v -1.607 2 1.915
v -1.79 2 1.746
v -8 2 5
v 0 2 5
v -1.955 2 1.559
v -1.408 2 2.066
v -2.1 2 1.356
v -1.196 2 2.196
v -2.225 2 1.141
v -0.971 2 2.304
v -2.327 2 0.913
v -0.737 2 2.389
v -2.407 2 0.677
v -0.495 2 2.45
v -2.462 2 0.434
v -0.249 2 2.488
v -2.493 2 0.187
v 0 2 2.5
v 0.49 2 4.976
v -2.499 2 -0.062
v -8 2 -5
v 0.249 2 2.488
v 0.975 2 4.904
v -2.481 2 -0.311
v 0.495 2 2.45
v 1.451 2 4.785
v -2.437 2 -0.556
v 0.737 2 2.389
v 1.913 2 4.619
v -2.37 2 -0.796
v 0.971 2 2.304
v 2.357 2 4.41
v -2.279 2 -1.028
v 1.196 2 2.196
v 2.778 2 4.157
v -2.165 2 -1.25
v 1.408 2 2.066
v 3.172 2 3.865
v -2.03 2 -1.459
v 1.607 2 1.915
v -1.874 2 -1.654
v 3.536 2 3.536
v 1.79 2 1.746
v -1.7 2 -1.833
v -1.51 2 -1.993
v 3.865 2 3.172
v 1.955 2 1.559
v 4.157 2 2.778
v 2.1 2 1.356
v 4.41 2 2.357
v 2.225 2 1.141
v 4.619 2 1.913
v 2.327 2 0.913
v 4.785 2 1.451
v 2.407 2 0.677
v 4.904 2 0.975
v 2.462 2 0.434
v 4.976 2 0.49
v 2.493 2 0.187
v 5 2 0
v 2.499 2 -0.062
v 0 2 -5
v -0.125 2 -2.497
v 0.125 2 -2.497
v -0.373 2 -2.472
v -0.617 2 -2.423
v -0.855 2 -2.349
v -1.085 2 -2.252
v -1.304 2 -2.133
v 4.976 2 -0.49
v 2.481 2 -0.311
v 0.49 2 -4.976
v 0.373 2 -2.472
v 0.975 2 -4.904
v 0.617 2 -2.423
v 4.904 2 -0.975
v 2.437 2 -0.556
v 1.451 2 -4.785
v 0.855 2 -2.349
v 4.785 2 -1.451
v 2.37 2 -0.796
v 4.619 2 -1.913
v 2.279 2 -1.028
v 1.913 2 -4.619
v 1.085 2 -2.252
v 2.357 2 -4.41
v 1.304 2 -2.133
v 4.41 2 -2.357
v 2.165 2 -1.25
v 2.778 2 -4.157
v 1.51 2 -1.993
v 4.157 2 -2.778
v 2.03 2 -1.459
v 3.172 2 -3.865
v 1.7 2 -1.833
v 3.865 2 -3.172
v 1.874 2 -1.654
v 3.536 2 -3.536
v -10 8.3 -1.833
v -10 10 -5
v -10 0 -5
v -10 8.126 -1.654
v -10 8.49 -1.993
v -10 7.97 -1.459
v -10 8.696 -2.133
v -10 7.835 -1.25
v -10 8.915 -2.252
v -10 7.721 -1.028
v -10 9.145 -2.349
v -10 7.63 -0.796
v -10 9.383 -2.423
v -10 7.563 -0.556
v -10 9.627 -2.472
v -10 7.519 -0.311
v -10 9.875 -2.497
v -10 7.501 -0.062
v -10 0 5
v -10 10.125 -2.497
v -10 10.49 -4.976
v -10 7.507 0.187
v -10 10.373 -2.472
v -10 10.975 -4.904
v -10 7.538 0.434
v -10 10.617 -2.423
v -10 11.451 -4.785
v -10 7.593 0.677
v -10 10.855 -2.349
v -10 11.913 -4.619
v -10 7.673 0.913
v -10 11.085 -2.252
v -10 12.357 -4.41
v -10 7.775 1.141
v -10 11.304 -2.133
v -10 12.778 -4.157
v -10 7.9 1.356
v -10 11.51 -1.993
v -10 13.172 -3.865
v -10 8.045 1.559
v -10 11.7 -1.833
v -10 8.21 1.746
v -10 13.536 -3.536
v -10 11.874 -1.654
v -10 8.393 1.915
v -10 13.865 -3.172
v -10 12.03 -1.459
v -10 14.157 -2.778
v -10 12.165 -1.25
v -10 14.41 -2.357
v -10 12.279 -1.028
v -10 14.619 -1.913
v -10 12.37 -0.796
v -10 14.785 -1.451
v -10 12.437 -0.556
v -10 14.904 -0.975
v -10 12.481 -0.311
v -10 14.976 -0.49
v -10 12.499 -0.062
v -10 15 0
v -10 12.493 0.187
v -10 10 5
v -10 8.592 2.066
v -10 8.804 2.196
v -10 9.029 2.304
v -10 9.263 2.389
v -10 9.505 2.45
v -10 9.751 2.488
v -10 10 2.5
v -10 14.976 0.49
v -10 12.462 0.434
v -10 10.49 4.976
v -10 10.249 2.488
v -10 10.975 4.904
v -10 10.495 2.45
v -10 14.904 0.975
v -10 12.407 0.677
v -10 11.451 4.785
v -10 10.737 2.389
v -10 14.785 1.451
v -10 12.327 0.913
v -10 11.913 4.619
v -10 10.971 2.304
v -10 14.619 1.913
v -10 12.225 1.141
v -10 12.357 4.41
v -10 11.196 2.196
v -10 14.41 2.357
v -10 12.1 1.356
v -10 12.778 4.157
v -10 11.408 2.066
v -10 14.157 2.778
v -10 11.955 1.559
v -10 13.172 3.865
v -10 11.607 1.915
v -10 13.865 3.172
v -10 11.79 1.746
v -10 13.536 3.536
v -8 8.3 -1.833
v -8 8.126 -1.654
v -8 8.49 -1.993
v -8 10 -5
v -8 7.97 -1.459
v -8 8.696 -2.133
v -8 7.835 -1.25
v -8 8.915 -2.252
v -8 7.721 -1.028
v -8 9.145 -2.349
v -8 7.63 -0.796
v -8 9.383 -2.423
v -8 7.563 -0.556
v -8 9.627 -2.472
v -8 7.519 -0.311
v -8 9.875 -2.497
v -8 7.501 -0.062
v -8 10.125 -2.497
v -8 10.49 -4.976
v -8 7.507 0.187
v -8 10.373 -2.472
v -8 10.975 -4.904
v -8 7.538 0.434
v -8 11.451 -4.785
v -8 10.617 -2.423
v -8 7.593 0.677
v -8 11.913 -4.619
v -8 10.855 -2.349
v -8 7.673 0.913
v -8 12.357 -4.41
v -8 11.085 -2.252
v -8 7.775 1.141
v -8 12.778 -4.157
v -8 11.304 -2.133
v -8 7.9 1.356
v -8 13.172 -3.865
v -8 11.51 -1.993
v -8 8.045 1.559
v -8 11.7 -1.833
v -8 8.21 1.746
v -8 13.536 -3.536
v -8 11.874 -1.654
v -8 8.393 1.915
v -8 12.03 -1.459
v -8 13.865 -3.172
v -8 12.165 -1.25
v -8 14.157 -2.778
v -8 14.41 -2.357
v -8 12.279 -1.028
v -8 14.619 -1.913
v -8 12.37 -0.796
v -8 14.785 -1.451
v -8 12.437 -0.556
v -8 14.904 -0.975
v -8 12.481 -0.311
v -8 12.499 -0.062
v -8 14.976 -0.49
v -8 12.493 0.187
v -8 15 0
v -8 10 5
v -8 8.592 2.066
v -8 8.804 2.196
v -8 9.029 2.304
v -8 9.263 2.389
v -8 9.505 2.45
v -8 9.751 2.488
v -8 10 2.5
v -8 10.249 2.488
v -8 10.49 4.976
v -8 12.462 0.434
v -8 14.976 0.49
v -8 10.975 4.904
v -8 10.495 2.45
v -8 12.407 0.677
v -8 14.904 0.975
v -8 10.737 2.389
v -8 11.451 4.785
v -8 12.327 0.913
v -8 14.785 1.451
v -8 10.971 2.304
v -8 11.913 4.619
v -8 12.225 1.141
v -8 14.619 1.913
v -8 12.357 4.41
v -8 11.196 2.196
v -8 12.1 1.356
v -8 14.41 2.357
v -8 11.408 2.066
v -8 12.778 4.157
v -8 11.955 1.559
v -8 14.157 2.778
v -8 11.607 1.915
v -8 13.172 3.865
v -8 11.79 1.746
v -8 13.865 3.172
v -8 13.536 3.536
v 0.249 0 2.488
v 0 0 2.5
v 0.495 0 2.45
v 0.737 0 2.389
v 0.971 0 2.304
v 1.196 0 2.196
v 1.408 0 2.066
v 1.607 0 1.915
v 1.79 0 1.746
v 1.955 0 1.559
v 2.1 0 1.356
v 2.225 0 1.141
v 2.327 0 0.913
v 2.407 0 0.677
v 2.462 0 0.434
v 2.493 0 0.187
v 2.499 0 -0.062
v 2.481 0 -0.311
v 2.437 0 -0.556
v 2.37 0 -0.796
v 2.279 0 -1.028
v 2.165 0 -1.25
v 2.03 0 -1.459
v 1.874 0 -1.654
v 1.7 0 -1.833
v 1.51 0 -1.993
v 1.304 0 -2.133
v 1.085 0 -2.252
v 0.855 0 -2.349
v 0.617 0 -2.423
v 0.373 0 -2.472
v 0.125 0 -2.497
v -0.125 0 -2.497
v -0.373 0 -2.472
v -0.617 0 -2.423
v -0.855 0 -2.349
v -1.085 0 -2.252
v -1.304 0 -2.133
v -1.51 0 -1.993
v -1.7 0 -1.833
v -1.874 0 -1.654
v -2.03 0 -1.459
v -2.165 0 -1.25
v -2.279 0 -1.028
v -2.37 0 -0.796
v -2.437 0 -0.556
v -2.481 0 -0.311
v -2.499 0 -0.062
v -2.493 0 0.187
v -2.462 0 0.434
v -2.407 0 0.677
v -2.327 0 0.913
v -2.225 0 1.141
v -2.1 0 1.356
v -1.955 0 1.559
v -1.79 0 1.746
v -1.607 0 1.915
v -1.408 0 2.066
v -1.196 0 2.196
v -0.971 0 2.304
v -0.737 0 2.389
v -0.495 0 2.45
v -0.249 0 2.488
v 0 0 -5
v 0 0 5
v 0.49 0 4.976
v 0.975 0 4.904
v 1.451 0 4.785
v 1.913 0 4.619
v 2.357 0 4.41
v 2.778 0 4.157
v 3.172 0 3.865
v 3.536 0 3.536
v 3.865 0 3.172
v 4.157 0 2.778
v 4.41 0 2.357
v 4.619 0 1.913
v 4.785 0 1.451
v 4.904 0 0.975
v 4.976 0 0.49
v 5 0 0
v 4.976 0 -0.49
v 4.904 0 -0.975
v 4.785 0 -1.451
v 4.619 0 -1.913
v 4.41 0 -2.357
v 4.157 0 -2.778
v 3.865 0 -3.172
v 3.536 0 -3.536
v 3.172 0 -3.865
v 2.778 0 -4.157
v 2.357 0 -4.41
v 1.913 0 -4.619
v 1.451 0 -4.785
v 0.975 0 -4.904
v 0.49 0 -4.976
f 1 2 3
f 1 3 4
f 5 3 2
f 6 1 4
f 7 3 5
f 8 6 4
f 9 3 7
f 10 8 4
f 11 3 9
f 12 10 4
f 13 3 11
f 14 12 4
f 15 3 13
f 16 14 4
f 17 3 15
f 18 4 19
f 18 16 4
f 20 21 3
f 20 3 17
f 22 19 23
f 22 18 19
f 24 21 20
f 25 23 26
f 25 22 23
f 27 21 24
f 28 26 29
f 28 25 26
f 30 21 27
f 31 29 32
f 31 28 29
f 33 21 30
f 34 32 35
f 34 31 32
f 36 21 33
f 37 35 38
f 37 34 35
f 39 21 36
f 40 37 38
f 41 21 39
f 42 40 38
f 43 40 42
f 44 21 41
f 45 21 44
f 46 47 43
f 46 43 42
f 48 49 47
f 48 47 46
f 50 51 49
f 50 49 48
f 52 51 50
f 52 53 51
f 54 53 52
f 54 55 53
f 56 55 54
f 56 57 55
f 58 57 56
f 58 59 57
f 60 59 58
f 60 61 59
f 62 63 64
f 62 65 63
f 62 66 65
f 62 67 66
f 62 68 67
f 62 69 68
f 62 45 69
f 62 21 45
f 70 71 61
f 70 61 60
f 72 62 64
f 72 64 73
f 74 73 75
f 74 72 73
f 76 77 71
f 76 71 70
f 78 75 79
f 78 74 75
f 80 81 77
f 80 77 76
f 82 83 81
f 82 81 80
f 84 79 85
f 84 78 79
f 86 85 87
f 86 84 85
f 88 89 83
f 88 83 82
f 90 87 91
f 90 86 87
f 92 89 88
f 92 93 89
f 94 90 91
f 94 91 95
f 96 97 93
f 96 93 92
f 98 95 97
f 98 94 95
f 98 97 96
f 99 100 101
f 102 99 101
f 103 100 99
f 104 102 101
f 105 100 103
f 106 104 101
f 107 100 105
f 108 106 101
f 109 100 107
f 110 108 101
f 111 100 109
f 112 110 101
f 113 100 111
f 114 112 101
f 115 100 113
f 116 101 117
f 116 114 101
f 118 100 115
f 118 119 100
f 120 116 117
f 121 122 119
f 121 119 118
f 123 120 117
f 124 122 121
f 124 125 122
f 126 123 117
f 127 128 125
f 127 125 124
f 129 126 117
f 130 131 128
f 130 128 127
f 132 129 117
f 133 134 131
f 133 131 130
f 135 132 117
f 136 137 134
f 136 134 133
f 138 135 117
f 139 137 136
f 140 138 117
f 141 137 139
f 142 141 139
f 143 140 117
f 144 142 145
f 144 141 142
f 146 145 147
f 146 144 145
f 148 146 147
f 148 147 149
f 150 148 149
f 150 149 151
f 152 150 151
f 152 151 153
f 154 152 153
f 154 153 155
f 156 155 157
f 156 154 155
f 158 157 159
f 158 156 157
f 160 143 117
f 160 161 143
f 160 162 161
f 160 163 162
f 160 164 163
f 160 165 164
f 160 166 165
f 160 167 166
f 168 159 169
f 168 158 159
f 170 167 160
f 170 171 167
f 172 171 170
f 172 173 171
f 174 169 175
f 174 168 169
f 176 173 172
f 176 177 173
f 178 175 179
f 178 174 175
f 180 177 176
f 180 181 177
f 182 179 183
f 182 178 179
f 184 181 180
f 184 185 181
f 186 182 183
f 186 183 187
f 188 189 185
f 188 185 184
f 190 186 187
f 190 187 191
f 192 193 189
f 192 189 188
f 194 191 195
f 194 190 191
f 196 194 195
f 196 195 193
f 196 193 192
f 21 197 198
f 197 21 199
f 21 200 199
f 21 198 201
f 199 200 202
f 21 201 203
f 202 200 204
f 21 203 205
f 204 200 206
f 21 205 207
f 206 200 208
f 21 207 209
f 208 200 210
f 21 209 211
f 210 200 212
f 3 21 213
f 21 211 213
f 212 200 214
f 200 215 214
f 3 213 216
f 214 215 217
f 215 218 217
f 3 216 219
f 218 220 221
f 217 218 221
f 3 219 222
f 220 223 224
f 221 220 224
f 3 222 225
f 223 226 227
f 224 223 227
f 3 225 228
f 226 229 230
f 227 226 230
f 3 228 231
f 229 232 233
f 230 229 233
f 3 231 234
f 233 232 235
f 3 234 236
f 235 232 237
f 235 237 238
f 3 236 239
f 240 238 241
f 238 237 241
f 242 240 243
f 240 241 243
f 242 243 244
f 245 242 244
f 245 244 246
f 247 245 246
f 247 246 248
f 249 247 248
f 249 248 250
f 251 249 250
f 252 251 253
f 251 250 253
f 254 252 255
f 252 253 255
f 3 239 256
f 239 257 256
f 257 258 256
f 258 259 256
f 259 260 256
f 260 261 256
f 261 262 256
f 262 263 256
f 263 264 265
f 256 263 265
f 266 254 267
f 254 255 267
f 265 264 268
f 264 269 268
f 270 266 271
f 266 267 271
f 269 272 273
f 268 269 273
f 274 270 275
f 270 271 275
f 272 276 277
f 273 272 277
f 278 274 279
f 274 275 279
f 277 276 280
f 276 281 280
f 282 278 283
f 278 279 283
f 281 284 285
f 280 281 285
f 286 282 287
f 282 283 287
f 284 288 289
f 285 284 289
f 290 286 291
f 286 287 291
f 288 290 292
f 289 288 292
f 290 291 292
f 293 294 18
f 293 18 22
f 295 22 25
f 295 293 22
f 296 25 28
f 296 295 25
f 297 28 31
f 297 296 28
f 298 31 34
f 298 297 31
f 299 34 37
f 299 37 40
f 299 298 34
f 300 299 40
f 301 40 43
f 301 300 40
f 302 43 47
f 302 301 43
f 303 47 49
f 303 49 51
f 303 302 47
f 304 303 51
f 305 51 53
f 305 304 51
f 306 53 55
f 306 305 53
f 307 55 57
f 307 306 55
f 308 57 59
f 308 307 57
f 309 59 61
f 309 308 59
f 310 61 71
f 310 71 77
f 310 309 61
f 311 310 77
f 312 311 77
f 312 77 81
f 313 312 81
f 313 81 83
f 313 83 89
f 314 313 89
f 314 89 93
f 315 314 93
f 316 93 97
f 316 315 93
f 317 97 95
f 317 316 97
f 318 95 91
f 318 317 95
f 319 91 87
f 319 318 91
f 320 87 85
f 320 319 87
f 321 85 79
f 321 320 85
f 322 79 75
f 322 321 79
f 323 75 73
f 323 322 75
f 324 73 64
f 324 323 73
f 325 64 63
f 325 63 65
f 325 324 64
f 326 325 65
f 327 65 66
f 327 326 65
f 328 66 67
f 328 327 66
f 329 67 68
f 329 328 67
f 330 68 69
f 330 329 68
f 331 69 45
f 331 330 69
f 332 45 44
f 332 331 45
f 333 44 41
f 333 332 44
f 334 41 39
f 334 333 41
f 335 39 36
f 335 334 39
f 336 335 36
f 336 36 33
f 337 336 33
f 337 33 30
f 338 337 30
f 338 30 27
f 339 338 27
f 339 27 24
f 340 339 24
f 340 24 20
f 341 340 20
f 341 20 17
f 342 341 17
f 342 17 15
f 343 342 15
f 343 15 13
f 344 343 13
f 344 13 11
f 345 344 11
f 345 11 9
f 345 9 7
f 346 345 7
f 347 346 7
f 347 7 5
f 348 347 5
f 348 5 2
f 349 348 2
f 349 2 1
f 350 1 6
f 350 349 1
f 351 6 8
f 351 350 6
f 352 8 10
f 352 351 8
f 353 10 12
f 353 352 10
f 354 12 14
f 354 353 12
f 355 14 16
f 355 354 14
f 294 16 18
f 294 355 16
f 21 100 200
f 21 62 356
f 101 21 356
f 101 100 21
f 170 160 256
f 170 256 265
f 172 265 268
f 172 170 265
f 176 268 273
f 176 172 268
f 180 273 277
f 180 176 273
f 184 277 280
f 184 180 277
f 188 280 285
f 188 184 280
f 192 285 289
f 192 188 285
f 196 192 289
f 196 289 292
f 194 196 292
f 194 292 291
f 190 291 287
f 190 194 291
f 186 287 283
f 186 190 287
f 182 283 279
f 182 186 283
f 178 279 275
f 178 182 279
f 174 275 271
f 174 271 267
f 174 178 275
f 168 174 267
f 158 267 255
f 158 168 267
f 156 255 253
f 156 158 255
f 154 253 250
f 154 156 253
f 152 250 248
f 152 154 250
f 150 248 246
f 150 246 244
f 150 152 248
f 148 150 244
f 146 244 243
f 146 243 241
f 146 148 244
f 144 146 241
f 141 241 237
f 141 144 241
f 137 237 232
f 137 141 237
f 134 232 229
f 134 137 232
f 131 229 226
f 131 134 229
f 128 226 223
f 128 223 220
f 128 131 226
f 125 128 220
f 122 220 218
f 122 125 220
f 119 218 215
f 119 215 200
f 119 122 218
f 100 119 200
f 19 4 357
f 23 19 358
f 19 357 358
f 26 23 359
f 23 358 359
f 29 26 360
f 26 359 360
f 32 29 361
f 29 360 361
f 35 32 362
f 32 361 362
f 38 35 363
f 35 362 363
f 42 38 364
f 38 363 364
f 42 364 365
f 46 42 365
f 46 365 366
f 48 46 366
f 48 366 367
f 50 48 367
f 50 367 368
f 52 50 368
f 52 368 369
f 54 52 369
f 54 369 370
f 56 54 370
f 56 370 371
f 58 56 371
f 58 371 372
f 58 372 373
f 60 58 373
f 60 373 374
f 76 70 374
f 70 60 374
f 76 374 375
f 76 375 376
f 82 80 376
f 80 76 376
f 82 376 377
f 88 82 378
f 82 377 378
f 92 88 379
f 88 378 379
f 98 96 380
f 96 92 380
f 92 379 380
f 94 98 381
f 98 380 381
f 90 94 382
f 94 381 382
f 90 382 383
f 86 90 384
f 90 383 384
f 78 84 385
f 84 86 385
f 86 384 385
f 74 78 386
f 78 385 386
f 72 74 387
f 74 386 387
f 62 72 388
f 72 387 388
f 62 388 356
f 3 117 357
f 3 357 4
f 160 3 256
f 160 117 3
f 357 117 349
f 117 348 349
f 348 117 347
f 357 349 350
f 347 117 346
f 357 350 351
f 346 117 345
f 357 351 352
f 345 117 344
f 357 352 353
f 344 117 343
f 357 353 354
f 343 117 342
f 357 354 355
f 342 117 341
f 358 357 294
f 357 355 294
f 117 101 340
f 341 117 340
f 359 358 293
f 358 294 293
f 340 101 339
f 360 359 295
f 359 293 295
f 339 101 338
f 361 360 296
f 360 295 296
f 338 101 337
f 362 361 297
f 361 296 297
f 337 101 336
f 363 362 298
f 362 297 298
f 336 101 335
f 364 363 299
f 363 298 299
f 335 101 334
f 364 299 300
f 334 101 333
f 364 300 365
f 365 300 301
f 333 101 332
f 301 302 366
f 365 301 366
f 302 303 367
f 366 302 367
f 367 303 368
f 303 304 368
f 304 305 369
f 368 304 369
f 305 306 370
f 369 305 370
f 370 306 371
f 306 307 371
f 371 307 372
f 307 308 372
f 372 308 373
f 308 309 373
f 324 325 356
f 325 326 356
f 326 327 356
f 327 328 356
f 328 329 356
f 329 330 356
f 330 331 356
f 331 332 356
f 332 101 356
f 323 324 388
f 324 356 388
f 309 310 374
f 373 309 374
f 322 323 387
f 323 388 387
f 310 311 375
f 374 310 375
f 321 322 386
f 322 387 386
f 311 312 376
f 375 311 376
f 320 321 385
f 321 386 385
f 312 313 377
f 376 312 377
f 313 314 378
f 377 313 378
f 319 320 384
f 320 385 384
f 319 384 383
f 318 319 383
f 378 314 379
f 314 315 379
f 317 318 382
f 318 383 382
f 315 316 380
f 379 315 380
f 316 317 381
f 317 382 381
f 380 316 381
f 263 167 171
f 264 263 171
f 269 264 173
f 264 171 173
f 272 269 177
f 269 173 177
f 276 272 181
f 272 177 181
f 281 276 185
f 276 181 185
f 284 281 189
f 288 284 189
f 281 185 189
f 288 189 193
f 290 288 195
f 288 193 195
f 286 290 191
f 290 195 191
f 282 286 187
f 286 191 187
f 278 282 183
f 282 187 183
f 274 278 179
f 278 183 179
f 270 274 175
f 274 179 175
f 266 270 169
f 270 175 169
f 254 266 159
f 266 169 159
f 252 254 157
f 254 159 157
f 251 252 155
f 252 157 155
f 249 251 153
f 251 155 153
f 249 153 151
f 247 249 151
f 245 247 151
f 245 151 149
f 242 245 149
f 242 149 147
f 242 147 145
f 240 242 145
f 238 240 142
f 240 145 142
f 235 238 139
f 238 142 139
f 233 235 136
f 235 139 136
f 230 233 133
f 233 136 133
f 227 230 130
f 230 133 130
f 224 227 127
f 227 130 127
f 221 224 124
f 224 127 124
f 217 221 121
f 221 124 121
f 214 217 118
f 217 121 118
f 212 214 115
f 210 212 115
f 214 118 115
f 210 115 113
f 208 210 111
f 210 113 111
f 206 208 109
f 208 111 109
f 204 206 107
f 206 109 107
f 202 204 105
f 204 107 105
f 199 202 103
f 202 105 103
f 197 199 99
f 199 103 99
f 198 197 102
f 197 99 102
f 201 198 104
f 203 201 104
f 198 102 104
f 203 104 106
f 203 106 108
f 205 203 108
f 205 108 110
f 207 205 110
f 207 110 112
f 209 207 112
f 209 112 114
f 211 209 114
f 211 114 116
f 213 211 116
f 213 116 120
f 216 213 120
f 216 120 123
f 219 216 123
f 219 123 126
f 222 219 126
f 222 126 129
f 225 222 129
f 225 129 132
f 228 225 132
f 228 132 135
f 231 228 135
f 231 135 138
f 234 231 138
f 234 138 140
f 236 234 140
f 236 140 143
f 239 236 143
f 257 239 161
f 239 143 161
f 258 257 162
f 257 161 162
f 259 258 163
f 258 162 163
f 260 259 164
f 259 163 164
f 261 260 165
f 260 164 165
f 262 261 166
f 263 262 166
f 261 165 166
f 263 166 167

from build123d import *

# Parameters (mm, degrees)
ESBO_O1_R                = 5
ESBO_O1_R_2              = 2.5
RESSALTO_EXTRUS_O1_DEPTH = 2
ESBO_O2_R                = 2.5
RESSALTO_EXTRUS_O2_DEPTH = 2


with BuildPart() as part:
    # Esboço1 → Ressalto-extrusão1 (new body)
    # profile 1 of 2: a face of its own
    with BuildSketch(Plane(origin=(0, 0, 0), x_dir=(1, 0, 0), z_dir=(0, 1, 0))):
        with BuildLine():
            ThreePointArc((0, -5), (-5, 0), (0, 5))
            Line((0, 5), (-10, 5))
            Line((-10, 5), (-10, -5))
            Line((-10, -5), (0, -5))
        make_face()
    # profile 2 of 2: a face of its own
    with BuildSketch(Plane(origin=(0, 0, 0), x_dir=(1, 0, 0), z_dir=(0, 1, 0))):
        Circle(ESBO_O1_R)
        with Locations(Location((0, 0, 0), (0, 0, 270))):
            Circle(ESBO_O1_R_2, mode=Mode.SUBTRACT)
    extrude(amount=RESSALTO_EXTRUS_O1_DEPTH)

    # Esboço2 → Ressalto-extrusão2 (add)
    with BuildSketch(Plane.ZY.offset(10)):
        with BuildLine():
            ThreePointArc((5, 10), (0, 15), (-5, 10))
            Line((-5, 10), (-5, 2))
            Line((-5, 2), (5, 2))
            Line((5, 2), (5, 10))
        make_face()
        with Locations((0, 10)):
            Circle(ESBO_O2_R, mode=Mode.SUBTRACT)
    extrude(amount=-RESSALTO_EXTRUS_O2_DEPTH)


solid = part.part
